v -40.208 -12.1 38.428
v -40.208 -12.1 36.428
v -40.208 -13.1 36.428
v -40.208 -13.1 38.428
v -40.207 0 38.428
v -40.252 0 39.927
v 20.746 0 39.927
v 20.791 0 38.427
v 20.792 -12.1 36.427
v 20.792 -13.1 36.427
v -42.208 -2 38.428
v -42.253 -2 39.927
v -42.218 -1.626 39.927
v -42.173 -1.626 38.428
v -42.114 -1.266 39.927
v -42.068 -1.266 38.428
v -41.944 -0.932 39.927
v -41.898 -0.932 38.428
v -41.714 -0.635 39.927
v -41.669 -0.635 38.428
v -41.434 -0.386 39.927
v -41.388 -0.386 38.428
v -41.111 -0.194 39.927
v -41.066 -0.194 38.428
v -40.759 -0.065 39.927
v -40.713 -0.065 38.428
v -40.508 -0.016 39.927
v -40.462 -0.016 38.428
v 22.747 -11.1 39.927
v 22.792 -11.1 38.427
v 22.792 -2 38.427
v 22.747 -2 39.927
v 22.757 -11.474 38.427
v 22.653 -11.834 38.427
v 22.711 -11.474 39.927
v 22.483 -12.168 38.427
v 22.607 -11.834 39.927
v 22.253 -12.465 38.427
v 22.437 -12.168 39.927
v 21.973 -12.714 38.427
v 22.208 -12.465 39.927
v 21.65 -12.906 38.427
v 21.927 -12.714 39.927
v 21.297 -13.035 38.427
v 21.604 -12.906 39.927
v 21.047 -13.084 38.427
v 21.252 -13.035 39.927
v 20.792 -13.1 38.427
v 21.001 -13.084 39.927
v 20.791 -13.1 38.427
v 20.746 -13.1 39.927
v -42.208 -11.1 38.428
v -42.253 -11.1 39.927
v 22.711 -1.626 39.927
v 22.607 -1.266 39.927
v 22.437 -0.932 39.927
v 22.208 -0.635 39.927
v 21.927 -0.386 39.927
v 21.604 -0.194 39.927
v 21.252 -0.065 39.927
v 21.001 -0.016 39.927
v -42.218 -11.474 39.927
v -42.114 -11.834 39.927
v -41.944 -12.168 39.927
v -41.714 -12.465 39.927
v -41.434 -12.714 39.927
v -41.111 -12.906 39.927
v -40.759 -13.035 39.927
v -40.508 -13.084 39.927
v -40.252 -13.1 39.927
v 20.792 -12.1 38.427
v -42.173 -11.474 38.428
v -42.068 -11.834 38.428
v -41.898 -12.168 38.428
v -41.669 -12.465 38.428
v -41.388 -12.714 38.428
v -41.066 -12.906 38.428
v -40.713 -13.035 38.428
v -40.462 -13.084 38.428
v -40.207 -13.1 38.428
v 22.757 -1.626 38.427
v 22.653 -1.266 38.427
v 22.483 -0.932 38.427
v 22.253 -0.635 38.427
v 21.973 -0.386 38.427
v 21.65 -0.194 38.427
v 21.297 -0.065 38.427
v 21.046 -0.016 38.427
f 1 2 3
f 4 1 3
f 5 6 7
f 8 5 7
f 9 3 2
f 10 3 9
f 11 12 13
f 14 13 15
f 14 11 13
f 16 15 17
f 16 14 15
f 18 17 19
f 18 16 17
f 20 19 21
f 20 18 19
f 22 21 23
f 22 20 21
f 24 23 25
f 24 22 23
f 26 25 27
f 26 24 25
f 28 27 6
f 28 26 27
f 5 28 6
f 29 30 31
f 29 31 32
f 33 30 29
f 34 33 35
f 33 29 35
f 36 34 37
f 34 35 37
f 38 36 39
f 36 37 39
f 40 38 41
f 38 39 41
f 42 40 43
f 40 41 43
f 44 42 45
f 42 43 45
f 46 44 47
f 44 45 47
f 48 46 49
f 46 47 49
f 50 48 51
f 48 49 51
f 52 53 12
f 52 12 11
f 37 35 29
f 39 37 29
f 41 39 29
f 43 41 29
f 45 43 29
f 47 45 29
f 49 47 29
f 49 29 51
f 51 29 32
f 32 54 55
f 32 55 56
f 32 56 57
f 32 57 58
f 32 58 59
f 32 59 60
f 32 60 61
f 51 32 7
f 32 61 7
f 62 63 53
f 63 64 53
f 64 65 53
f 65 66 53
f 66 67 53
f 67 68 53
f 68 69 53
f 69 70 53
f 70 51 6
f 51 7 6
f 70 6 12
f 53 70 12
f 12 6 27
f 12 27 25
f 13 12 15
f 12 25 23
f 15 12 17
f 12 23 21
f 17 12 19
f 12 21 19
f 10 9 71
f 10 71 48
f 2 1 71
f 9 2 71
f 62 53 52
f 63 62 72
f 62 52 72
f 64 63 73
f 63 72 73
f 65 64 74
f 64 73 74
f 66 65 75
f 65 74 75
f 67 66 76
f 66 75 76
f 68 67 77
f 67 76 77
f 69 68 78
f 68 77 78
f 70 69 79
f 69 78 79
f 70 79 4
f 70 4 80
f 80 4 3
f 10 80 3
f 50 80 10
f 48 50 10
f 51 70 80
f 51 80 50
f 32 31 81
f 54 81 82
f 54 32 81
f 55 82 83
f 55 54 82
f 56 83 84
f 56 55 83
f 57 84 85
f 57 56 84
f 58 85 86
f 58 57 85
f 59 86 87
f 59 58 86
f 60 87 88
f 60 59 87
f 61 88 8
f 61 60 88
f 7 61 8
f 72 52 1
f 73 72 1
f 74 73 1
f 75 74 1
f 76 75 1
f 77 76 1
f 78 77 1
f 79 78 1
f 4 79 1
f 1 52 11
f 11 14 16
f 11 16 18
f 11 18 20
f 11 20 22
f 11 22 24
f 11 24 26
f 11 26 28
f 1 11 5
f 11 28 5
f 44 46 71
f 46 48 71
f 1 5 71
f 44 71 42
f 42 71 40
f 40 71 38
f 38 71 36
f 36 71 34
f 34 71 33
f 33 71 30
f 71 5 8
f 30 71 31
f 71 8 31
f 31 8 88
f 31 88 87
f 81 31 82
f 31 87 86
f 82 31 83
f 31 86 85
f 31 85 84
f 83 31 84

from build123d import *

# Parameters (mm, degrees)
F1_DEPTH = 13.1
F3_R     = 2
F2_W     = 61
F2_H     = 1
F4_DEPTH = 2


# Not quite as in the source:
# - a feature names something its author has since deleted; it is built from what else it names


with BuildPart() as f1:
    # F0 (on Front) → F1 (new body)
    with BuildSketch(Plane.XZ):
        Polygon((22.7466161251, 39.9272560477), (-42.2533838749, 39.9272560477), (-42.2077284126, 38.4279510158), (22.7922715837, 38.4272560477), align=None)
    extrude(amount=F1_DEPTH)

    # F3
    f3_edges = [f1.edges().sort_by_distance(p)[0] for p in [
        (-42.230556, -13.1, 39.177604),
        (22.769444, -13.1, 39.177256),
        (22.769444, 0, 39.177256),
        (-42.230556, 0, 39.177604),
    ]]
    fillet(f3_edges, radius=F3_R)

    # F2 (on face) → F4 (join)
    with BuildSketch(Plane(origin=(0.0004108598, 0, 38.4274997341), x_dir=(0.9999999999, 0, -1.06918e-05), z_dir=(-1.06918e-05, 0, -0.9999999999))):
        with Locations((-9.7081392748, 12.6)):
            Rectangle(F2_W, F2_H)
    extrude(amount=F4_DEPTH)


solid = f1.part
